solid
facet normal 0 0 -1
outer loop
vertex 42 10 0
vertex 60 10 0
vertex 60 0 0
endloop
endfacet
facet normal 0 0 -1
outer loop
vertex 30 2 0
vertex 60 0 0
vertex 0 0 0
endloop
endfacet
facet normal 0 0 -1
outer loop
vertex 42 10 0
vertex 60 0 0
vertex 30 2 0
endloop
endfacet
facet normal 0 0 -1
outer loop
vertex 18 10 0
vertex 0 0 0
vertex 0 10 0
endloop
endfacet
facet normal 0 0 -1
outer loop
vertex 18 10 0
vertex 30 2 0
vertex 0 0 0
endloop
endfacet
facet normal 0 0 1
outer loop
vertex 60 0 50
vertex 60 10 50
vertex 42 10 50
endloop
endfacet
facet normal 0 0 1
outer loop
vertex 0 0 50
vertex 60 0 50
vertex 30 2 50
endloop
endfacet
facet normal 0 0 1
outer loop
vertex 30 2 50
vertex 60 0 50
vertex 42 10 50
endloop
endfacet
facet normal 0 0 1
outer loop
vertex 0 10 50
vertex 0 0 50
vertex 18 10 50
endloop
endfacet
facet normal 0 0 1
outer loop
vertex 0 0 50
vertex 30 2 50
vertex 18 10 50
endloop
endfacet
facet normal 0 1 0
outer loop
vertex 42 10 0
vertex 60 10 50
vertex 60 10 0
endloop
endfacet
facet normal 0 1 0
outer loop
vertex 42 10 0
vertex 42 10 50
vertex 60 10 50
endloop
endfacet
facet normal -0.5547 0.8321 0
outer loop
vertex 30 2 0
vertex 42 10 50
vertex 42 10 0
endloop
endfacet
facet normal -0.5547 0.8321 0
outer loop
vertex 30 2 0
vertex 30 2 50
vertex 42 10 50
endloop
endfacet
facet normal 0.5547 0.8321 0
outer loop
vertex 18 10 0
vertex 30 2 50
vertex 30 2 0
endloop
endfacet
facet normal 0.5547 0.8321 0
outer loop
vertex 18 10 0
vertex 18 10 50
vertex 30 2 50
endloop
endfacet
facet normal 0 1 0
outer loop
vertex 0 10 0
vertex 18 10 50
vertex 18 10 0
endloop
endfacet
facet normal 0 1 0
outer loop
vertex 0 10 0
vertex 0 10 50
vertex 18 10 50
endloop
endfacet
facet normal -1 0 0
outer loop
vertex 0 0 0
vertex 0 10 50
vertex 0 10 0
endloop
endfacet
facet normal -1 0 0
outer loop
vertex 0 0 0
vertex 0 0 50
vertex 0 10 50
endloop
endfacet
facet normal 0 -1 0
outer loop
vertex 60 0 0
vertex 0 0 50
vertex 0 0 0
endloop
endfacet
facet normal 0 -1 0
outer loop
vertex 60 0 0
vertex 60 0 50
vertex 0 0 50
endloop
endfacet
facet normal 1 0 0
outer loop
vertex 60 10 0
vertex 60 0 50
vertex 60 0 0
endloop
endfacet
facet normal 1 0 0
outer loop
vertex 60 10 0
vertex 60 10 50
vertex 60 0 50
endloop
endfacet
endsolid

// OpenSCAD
$fn = 32;

// ----------------------------------------------------------------------
// V guide rail: vway, 60 mm wide
// ----------------------------------------------------------------------

// --- parameters (mm) ---
rail_w = 60;              // rail width, X
base_t = 10;              // base plate thickness
v_depth = 8;              // V feature depth / height
v_half_w = 12;            // half width of the V at the base face
plate_t = 50;             // rail length, Z (the extrusion height)

profile = [[0, 0], [60, 0], [60, 10], [42, 10], [30, 2], [18, 10], [0, 10]];  // primary outline, 7 points, counter clockwise

// --- the one profile operation ---
linear_extrude(height = plate_t) polygon(points = profile);
